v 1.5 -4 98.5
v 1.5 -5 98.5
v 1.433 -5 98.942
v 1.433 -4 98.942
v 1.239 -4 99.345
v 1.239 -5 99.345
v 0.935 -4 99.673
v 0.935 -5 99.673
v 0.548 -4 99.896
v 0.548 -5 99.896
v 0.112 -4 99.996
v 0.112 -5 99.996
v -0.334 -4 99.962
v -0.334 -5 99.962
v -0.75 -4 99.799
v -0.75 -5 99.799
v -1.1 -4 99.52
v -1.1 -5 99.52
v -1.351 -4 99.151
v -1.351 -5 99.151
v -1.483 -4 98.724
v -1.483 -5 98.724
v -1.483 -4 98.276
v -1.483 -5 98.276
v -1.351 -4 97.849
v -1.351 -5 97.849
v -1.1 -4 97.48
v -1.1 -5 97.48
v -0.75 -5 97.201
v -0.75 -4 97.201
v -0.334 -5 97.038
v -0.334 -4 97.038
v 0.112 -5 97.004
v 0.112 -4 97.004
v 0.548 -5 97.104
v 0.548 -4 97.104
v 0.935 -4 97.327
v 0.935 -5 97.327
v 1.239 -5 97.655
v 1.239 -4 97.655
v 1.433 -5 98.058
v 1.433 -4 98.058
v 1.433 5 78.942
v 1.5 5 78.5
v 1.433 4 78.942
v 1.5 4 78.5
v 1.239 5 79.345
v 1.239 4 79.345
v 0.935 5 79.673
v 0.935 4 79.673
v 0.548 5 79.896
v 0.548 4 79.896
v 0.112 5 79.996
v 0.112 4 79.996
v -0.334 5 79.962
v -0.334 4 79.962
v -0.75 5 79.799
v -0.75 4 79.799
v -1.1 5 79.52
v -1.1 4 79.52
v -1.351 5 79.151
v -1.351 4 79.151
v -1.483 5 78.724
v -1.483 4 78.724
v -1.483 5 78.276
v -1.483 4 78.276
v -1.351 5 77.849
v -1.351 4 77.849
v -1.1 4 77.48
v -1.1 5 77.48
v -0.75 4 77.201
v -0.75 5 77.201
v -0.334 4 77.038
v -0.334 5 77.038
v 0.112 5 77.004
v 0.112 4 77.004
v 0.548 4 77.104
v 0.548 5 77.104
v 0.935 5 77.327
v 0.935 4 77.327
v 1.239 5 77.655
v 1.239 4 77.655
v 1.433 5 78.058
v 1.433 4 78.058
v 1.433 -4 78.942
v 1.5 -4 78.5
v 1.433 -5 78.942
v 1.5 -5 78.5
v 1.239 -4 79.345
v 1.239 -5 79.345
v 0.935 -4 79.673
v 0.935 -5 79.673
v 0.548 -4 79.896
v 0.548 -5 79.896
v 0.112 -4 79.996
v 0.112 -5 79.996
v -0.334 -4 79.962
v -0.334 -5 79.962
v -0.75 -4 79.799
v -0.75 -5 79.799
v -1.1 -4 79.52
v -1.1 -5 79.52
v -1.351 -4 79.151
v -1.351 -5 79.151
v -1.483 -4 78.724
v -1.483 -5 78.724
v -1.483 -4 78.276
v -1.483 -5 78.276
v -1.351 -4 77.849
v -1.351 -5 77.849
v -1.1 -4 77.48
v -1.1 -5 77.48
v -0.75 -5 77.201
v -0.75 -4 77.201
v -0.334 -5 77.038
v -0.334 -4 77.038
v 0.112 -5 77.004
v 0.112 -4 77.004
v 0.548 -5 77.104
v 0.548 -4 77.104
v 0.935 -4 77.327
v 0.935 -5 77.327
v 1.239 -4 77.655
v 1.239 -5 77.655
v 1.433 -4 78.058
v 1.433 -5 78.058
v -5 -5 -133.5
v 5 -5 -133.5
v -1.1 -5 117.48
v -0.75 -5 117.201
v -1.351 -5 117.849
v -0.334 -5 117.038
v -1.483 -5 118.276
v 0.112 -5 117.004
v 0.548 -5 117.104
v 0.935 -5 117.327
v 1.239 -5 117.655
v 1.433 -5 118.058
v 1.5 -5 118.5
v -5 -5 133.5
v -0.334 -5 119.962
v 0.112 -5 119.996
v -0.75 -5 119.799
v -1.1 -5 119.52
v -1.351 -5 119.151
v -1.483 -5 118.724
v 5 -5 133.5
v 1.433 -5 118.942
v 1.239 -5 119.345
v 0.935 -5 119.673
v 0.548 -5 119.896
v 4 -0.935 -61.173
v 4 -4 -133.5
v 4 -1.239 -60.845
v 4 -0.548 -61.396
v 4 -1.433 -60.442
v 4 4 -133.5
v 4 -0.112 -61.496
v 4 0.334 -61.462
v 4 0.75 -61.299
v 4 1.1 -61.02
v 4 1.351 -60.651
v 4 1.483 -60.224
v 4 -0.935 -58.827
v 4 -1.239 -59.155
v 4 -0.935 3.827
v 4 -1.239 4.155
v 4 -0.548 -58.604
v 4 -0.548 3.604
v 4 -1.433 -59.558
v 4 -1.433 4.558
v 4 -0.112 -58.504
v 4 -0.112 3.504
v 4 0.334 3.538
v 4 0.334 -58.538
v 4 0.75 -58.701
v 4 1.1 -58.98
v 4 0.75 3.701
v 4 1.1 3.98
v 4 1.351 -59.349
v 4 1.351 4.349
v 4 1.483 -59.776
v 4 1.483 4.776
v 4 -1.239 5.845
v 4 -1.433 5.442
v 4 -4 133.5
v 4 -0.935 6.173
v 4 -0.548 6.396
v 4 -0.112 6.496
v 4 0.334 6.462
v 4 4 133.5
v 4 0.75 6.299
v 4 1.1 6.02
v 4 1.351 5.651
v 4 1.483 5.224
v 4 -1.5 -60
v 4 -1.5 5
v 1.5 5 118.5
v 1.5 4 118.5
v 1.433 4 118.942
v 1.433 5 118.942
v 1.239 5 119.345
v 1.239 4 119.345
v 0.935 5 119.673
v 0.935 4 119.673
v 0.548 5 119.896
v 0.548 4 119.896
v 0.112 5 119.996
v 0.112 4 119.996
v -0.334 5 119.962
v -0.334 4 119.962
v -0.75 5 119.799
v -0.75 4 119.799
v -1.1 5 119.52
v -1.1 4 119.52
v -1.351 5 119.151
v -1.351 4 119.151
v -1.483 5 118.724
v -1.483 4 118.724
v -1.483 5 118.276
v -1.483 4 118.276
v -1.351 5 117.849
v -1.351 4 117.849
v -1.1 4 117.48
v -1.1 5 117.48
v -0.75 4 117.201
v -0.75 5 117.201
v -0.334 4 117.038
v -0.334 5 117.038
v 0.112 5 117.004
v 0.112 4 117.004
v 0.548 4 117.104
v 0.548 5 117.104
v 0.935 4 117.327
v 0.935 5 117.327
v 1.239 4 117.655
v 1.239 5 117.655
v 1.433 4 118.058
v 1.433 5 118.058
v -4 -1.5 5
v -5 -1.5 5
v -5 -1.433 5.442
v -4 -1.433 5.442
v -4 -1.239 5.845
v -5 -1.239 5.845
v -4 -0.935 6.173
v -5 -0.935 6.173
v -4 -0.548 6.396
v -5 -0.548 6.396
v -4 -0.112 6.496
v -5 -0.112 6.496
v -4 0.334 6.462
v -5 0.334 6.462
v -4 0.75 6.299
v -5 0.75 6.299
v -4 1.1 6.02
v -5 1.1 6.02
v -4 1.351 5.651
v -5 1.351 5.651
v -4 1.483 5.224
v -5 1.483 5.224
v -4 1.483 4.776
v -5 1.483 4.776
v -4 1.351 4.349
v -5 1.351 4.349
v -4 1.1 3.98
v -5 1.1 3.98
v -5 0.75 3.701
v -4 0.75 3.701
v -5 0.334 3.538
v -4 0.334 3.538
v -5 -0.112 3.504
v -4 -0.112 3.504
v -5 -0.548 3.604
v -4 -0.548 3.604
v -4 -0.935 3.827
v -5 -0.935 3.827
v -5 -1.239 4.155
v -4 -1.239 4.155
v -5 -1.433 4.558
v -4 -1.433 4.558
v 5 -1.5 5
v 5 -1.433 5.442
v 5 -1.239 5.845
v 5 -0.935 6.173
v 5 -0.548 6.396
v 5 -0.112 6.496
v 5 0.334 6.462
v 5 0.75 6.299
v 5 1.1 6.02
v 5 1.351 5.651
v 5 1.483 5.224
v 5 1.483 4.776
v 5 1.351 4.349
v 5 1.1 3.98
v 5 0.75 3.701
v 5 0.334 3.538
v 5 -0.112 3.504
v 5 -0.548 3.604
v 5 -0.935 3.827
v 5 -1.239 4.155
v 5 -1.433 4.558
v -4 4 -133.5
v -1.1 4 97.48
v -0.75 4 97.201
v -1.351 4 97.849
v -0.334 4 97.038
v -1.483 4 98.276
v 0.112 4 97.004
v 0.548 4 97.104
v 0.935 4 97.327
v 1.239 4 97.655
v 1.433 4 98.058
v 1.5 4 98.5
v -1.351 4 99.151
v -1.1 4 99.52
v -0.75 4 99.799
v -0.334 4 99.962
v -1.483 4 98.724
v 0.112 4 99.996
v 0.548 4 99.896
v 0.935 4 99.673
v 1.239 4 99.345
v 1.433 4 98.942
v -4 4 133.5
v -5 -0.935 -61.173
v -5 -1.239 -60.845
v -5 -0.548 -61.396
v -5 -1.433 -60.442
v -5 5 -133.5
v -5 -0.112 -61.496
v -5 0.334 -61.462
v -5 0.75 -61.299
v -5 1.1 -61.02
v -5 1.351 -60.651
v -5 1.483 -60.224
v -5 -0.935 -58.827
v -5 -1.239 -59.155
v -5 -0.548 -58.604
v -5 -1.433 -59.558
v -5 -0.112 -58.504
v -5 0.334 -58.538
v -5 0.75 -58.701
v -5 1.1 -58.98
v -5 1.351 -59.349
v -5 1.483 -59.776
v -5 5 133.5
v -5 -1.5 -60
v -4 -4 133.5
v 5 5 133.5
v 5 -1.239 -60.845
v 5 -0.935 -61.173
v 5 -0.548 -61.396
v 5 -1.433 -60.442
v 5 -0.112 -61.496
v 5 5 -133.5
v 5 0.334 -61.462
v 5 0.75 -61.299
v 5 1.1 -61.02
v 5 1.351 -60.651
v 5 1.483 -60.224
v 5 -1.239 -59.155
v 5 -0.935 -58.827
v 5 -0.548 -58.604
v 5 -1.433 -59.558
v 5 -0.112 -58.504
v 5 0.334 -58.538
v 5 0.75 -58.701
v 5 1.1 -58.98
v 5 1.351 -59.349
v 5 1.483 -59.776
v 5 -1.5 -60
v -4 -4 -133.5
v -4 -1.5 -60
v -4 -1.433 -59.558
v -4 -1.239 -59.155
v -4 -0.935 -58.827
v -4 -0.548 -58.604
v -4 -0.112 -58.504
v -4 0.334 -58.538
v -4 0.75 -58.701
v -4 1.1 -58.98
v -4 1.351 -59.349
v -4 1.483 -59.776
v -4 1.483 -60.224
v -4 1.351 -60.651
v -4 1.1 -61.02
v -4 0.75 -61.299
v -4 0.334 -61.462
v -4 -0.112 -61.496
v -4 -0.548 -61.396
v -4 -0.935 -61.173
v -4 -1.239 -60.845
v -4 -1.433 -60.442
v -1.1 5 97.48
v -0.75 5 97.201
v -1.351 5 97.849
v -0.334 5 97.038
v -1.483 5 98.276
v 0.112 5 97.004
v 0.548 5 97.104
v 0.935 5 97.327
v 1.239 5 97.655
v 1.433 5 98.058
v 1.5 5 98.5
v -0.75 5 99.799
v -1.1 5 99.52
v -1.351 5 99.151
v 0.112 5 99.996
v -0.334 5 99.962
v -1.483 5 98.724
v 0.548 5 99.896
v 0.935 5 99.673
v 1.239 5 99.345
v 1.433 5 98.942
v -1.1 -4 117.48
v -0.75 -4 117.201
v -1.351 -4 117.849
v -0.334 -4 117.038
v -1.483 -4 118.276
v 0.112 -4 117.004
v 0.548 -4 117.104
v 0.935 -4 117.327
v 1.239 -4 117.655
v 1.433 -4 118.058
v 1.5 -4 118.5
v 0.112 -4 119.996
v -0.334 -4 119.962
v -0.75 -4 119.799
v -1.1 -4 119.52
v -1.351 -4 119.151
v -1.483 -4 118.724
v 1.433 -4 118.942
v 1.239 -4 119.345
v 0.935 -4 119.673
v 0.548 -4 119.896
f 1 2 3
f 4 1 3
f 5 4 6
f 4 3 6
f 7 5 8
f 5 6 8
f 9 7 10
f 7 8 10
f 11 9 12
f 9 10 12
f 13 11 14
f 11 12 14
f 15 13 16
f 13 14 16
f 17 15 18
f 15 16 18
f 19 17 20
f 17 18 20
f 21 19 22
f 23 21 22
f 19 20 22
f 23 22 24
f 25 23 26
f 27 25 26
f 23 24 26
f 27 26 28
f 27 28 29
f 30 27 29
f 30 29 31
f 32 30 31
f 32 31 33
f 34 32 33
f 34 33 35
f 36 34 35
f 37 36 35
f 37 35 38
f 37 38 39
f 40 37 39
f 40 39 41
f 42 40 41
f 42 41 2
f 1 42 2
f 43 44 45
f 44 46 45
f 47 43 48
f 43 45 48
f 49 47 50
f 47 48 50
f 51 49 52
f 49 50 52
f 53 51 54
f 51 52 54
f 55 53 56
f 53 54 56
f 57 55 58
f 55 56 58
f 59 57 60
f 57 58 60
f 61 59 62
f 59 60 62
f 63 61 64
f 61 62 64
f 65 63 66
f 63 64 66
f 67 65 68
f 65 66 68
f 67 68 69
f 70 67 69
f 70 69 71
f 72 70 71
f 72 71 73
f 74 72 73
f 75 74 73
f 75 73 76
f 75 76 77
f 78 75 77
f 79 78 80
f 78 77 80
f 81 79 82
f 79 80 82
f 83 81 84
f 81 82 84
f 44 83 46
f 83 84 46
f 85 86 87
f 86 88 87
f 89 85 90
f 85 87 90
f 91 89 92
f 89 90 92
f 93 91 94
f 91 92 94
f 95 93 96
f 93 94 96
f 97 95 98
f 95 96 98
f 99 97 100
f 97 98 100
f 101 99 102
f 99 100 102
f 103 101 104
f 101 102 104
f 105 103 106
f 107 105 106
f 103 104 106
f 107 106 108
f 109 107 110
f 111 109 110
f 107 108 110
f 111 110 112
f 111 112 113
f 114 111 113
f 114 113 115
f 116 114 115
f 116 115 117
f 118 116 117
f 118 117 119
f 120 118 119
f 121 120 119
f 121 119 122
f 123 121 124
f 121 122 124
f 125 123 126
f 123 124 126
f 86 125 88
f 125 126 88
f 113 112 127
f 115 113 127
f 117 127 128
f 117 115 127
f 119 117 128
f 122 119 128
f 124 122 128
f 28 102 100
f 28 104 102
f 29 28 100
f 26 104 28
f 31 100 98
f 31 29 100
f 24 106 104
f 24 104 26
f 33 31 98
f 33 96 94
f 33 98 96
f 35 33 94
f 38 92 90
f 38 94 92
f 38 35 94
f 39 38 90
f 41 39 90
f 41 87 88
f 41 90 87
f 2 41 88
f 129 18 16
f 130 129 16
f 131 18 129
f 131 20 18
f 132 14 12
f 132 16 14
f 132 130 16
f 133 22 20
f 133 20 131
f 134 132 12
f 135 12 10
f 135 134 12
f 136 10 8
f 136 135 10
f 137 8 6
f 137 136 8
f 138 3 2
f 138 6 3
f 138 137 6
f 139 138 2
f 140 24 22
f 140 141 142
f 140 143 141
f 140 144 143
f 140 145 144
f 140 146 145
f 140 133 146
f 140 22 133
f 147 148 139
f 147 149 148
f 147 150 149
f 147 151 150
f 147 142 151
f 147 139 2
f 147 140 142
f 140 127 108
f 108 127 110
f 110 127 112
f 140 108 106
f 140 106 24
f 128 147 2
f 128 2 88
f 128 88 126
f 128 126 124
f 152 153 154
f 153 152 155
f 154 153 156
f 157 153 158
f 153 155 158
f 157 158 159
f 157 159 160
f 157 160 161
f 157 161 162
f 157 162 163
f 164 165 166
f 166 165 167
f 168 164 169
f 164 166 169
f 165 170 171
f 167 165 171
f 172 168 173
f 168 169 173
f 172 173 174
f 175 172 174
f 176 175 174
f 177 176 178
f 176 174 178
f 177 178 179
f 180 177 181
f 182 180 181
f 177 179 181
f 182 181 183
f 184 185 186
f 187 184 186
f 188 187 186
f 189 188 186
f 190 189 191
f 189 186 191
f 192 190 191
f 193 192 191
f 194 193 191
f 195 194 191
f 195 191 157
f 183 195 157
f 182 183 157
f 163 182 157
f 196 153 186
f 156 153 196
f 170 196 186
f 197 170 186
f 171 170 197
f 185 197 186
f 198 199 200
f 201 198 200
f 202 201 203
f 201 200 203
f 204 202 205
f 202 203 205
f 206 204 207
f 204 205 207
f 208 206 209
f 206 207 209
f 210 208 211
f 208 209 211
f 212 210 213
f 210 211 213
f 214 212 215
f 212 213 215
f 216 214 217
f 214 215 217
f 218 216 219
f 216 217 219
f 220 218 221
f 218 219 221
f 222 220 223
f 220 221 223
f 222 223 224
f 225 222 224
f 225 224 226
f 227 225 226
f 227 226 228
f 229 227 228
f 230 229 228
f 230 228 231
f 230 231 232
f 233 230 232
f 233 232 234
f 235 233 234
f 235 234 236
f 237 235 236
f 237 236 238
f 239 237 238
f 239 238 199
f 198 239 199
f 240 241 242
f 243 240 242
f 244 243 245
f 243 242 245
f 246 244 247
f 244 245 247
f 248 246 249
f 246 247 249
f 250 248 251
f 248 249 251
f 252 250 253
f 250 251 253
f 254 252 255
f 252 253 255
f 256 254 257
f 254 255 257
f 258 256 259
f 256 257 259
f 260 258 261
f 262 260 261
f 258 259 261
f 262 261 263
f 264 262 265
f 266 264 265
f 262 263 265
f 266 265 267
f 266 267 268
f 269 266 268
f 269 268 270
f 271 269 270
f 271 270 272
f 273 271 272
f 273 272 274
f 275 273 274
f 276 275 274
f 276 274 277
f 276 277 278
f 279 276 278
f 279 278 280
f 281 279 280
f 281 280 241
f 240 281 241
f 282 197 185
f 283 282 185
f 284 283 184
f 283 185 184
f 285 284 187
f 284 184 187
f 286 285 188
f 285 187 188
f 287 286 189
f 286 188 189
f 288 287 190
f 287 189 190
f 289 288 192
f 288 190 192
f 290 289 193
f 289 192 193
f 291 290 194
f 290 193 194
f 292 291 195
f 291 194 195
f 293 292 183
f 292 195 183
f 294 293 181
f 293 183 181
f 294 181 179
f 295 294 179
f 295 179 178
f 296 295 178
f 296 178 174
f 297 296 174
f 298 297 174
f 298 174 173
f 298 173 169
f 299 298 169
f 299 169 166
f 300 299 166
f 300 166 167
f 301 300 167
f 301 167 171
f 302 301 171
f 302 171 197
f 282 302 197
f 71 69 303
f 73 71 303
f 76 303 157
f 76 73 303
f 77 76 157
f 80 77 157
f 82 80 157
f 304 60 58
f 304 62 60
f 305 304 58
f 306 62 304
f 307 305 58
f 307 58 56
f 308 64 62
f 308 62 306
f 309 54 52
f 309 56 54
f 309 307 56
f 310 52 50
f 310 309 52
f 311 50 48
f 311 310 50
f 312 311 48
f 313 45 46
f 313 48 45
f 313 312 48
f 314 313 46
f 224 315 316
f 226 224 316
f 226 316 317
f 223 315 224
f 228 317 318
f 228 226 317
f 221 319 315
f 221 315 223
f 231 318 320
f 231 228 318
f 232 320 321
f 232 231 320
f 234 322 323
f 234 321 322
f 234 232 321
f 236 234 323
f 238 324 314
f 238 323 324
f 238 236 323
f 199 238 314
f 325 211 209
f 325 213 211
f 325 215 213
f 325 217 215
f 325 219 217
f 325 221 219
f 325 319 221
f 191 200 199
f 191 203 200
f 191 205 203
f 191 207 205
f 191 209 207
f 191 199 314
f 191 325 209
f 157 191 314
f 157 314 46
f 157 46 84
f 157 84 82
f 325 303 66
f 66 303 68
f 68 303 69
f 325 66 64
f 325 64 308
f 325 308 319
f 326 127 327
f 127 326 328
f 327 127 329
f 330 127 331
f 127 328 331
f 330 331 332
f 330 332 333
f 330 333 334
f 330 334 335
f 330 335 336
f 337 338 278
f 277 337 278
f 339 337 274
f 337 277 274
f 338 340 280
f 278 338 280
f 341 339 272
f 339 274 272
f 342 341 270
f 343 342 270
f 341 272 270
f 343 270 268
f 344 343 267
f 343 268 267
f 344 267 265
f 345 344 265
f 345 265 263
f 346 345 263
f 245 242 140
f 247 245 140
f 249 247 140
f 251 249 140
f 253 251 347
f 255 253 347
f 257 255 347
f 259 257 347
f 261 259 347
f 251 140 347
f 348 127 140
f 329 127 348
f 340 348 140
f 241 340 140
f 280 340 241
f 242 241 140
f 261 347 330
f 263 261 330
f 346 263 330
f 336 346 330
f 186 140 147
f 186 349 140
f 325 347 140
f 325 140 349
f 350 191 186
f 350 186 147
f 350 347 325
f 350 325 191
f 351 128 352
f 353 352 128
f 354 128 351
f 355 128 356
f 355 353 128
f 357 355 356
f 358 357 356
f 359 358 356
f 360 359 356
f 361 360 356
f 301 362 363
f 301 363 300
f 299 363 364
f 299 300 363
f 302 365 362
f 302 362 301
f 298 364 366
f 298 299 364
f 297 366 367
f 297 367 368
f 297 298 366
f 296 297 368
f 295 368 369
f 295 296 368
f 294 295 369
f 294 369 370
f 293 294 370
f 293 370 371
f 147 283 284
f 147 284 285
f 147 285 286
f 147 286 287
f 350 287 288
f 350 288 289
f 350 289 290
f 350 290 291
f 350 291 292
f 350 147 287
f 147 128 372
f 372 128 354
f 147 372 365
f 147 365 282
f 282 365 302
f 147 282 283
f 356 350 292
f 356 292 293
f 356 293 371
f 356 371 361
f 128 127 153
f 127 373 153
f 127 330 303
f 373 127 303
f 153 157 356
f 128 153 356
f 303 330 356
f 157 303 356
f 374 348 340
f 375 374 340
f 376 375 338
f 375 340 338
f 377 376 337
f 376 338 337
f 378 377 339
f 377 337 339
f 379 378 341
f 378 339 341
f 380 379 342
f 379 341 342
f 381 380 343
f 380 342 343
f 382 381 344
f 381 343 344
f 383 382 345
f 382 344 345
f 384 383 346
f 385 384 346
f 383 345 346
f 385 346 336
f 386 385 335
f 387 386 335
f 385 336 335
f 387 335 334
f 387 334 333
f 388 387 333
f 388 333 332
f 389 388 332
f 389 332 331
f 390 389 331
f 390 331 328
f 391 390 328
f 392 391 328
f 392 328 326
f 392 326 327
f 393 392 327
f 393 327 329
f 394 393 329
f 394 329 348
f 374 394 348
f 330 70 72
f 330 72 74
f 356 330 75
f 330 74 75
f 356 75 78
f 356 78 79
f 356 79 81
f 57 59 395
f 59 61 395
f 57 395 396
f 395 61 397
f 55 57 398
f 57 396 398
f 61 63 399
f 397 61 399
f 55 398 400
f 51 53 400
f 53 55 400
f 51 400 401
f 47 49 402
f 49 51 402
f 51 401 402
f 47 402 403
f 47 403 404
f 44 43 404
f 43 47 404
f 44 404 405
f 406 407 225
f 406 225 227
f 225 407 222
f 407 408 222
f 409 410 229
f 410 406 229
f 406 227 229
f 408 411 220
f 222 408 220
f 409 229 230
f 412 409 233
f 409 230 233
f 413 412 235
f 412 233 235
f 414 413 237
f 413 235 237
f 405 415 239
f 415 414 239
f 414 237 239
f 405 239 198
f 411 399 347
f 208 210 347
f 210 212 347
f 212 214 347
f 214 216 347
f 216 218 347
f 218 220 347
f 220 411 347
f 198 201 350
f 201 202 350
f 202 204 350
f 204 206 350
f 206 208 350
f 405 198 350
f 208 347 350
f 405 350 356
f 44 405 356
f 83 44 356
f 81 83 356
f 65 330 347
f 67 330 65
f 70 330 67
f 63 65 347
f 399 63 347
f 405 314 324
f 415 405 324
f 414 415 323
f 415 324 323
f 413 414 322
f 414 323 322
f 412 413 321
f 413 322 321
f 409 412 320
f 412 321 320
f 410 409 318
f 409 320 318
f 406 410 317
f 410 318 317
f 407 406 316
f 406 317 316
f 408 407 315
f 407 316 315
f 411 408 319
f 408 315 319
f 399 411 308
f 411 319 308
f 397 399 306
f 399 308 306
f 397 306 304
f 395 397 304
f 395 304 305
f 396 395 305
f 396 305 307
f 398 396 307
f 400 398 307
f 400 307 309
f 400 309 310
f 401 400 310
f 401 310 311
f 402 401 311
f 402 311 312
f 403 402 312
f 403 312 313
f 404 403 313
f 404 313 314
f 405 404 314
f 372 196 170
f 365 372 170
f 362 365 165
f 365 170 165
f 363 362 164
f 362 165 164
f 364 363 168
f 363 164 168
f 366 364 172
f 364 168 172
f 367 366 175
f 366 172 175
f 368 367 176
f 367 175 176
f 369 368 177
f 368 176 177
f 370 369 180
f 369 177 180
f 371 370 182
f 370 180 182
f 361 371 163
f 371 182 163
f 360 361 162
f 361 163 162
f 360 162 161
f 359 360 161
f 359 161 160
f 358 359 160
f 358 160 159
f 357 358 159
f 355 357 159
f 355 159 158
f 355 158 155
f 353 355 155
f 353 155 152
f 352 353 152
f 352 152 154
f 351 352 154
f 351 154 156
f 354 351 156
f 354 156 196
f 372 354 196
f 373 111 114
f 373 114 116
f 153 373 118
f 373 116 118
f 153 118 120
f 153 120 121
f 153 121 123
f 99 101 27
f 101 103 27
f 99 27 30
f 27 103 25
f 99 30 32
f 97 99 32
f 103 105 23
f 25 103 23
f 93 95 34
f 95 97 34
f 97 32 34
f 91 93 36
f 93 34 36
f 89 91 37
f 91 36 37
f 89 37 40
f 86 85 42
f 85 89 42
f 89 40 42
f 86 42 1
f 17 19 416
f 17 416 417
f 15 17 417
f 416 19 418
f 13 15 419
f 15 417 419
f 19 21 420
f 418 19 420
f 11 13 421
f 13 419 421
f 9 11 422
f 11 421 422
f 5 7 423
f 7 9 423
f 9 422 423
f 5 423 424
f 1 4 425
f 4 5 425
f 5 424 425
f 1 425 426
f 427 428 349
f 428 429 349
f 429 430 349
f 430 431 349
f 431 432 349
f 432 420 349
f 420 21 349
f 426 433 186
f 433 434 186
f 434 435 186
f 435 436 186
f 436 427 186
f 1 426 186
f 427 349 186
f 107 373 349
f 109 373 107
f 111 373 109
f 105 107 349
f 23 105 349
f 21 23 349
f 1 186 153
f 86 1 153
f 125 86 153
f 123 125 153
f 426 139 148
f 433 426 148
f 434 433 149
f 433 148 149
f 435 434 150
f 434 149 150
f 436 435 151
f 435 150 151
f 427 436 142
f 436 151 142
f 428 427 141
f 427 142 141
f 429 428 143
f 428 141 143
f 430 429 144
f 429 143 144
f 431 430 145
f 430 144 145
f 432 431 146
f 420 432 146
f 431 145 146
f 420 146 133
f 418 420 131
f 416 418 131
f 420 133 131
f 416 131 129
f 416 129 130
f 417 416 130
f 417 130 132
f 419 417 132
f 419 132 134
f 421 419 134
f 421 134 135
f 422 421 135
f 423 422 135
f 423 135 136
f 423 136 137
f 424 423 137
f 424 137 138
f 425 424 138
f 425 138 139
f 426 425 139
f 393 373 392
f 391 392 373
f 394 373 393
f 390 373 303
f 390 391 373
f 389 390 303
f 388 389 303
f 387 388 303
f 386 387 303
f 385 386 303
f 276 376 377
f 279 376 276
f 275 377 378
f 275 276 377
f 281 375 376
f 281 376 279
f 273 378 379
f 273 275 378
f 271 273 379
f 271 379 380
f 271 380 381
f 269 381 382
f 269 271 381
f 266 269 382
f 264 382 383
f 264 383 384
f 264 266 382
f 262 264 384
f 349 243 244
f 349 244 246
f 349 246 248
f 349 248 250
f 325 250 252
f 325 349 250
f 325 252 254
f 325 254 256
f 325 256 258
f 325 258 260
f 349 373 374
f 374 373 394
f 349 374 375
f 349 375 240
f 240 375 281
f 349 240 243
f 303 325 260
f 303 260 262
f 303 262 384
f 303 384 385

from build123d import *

# Parameters (mm, degrees)
SKETCH_1_W          = 10
SKETCH_1_H          = 10
SKETCH_1_W_2        = 8
SKETCH_1_H_2        = 8
EXTRUDE_1_DEPTH     = 133.5
SKETCH_2_R          = 1.5
CUT_EXTRUDE_1_DEPTH = 20
SKETCH_3_R          = 1.5
CUT_EXTRUDE_2_DEPTH = 40


with BuildPart() as part:
    # 草图1 → 凸台-拉伸1 (new, symmetric)
    with BuildSketch(Plane.XY):
        Rectangle(SKETCH_1_W, SKETCH_1_H)
        Rectangle(SKETCH_1_W_2, SKETCH_1_H_2, mode=Mode.SUBTRACT)
    extrude(amount=EXTRUDE_1_DEPTH, both=True)

    # 草图2 → 切除-拉伸1 (cut, symmetric)
    with BuildSketch(Plane.XZ.offset(5)):
        with Locations((0, 118.5)):
            Circle(SKETCH_2_R)
        with Locations((0, 98.5)):
            Circle(SKETCH_2_R)
        with Locations((0, 78.5)):
            Circle(SKETCH_2_R)
    extrude(amount=CUT_EXTRUDE_1_DEPTH, both=True, mode=Mode.SUBTRACT)

    # 草图3 → 切除-拉伸2 (cut)
    with BuildSketch(Plane.ZY.offset(5)):
        with Locations(Location((-60, 0, 0), (0, 0, 270))):
            Circle(SKETCH_3_R)
        with Locations(Location((5, 0, 0), (0, 0, 270))):
            Circle(SKETCH_3_R)
    extrude(amount=-CUT_EXTRUDE_2_DEPTH, mode=Mode.SUBTRACT)


solid = part.part
